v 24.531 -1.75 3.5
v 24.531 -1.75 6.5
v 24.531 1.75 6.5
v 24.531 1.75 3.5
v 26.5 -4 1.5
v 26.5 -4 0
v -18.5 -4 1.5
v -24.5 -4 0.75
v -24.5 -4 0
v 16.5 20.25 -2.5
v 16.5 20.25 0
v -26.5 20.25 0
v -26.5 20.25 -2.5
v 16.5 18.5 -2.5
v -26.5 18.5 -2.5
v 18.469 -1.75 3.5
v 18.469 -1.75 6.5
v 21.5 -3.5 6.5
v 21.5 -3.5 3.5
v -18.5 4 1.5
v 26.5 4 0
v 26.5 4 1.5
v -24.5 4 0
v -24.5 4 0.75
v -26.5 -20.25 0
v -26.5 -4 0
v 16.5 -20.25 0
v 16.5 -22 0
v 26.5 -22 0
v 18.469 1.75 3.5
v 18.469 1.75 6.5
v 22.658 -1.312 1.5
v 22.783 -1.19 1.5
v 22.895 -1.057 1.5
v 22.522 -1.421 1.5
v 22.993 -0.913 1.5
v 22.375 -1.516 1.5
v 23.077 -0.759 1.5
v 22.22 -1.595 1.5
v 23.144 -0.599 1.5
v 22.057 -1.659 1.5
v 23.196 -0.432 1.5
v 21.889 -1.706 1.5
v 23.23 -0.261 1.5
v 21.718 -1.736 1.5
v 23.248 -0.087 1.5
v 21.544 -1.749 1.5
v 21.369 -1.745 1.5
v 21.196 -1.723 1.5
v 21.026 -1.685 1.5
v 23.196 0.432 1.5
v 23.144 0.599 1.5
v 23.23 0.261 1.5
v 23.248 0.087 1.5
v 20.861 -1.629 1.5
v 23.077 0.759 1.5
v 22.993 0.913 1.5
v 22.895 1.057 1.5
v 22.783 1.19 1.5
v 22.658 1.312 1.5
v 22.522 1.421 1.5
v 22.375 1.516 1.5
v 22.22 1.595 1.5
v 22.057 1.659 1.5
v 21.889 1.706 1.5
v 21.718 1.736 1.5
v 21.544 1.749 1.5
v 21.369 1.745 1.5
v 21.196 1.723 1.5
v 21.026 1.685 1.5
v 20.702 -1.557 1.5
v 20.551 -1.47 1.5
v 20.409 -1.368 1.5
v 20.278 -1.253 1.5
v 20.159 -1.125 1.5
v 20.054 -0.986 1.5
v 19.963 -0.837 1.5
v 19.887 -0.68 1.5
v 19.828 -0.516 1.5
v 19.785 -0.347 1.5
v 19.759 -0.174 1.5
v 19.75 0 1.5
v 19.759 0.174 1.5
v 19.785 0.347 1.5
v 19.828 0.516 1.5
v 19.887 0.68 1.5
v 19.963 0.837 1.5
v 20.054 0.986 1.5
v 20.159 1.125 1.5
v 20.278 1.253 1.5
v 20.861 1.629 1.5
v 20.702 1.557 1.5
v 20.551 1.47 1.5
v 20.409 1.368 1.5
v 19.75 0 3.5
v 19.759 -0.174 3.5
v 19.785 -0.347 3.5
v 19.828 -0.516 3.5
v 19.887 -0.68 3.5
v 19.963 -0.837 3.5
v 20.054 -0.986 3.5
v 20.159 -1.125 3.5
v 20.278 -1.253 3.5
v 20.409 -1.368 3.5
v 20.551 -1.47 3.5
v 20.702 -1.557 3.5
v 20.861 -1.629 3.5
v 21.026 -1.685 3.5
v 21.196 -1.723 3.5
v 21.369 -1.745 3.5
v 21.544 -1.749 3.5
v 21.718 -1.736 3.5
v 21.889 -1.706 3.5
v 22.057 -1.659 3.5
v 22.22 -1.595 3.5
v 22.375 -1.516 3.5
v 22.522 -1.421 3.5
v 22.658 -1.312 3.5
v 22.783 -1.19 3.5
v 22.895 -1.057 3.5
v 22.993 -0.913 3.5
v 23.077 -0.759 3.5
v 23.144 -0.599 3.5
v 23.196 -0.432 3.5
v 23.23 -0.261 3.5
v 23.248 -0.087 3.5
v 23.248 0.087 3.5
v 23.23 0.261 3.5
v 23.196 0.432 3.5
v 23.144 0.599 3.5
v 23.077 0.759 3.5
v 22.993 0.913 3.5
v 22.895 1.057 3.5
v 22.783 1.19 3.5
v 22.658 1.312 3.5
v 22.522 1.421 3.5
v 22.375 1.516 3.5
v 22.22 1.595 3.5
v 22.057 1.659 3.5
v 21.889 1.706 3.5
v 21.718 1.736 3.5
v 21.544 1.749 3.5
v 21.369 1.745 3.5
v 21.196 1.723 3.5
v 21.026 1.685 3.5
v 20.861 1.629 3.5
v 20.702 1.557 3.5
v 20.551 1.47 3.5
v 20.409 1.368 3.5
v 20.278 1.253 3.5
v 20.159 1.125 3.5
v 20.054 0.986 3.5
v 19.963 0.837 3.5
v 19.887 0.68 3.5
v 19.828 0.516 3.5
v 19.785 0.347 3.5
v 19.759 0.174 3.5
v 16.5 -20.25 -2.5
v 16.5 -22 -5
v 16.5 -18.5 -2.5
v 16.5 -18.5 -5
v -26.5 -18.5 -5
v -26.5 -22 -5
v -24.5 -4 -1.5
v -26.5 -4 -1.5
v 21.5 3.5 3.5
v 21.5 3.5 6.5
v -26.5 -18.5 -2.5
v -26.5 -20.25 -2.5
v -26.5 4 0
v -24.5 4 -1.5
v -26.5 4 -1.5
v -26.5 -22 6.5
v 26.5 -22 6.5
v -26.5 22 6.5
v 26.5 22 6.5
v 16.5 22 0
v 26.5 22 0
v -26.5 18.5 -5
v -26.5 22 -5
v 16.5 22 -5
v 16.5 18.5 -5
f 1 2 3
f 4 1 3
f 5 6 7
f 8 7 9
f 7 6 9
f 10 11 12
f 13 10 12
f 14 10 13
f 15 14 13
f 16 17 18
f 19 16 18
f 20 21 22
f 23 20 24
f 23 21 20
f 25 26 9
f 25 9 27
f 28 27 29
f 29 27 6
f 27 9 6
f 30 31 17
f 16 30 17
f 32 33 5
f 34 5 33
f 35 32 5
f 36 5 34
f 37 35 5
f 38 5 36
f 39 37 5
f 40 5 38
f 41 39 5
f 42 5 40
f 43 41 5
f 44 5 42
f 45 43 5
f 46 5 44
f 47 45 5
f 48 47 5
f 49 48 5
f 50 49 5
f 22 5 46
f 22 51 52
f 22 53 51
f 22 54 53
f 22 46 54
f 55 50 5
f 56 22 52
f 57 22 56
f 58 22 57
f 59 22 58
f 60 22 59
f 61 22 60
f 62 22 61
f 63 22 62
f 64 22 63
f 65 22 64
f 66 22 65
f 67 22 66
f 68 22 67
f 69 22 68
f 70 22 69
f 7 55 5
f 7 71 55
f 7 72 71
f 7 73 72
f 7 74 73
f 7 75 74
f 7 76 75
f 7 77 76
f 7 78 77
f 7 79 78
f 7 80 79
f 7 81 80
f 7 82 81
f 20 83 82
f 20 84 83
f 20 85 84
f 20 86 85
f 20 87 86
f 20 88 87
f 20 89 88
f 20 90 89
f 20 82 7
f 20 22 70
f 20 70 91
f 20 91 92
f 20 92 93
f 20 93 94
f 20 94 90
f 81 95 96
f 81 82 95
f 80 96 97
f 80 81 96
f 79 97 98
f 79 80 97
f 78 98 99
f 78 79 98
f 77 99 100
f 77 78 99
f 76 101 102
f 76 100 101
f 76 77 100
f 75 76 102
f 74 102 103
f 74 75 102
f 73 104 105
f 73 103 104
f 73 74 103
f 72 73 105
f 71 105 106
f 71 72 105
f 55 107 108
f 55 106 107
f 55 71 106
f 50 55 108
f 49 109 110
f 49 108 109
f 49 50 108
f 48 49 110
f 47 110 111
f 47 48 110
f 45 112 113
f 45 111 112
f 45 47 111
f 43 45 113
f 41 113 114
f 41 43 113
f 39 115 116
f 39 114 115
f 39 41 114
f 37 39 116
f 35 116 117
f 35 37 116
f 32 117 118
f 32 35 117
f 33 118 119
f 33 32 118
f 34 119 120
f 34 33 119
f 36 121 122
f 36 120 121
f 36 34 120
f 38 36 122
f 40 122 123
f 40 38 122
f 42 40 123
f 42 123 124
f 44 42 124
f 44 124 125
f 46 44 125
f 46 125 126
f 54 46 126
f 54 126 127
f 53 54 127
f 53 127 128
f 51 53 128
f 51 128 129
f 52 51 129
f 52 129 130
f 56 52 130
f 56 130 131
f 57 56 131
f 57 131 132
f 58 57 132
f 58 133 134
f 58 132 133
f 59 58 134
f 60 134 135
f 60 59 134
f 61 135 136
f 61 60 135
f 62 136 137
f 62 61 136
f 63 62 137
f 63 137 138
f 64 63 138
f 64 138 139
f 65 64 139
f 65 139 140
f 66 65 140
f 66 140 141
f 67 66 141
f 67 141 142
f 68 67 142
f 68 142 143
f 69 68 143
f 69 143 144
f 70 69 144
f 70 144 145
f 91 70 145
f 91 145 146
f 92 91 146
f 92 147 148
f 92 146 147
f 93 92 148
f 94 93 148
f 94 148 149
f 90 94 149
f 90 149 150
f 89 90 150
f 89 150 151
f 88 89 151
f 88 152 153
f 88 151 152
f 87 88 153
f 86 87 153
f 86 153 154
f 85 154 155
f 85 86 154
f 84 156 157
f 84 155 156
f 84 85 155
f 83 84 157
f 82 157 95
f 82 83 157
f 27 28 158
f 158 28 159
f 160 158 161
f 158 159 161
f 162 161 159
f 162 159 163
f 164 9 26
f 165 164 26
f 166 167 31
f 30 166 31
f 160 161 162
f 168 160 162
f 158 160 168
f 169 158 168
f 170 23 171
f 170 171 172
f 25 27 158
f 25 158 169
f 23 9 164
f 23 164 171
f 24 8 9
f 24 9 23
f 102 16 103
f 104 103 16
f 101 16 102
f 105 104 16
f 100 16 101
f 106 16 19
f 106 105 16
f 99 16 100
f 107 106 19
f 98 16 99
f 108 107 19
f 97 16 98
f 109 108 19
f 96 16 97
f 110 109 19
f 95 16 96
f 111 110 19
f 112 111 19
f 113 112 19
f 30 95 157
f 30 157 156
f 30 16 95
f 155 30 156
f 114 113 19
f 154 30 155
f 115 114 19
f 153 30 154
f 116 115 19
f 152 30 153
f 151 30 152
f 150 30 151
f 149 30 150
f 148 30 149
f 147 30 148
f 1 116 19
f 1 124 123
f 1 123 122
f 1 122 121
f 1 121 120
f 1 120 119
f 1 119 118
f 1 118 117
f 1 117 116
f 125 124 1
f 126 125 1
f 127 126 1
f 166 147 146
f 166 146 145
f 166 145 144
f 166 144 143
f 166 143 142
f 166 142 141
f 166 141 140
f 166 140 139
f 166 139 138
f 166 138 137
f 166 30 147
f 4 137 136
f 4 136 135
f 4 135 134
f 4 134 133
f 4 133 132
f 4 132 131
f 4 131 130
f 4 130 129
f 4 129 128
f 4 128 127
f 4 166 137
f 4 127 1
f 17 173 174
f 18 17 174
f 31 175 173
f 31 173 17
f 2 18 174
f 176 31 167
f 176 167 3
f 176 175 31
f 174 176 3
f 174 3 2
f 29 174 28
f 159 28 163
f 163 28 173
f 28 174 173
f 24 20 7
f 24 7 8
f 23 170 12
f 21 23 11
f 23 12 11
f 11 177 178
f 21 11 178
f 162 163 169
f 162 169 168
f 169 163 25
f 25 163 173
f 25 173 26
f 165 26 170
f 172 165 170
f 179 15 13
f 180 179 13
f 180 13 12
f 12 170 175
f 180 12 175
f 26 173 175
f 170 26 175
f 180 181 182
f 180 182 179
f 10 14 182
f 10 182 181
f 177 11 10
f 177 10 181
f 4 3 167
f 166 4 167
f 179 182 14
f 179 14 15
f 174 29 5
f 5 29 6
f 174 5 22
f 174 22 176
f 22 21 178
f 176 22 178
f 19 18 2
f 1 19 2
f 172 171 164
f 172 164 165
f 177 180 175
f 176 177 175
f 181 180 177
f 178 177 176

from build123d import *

# Parameters (mm, degrees)
CROQUIS1_W              = 53
CROQUIS1_H              = 44
CROQUIS1_R              = 1.75
SALIENTE_EXTRUIR1_DEPTH = 6.5
CROQUIS3_W              = 43
CROQUIS3_H              = 1.75
SALIENTE_EXTRUIR2_DEPTH = 5
CROQUIS4_W              = 43
CROQUIS4_H              = 1.75
SALIENTE_EXTRUIR3_DEPTH = 2.5
CROQUIS5_W              = 53
CROQUIS5_H              = 8
CORTAR_EXTRUIR2_DEPTH   = 1.5
CROQUIS8_W              = 2
CROQUIS8_H              = 8
SALIENTE_EXTRUIR6_DEPTH = 3
SALIENTE_EXTRUIR7_DEPTH = 8
CORTAR_EXTRUIR3_DEPTH   = 3


with BuildPart() as part:
    # Croquis1 → Saliente-Extruir1 (new body)
    with BuildSketch(Plane.XY):
        Rectangle(CROQUIS1_W, CROQUIS1_H)
        with Locations(Location((21.5, 0, 0), (0, 0, 180))):
            Circle(CROQUIS1_R, mode=Mode.SUBTRACT)
    extrude(amount=SALIENTE_EXTRUIR1_DEPTH)

    # Croquis3 → Saliente-Extruir2 (add)
    with BuildSketch(Plane(origin=(0, 0, 0), x_dir=(-1, 0, 0), z_dir=(0, 0, -1))):
        with Locations((5, -21.125)):
            Rectangle(CROQUIS3_W, CROQUIS3_H)
        with Locations((5, 21.125)):
            Rectangle(CROQUIS3_W, CROQUIS3_H)
    extrude(amount=SALIENTE_EXTRUIR2_DEPTH)

    # Croquis4 → Saliente-Extruir3 (add)
    with BuildSketch(Plane(origin=(0, 0, -5), x_dir=(-1, 0, 0), z_dir=(0, 0, -1))):
        with Locations((5, -19.375)):
            Rectangle(CROQUIS4_W, CROQUIS4_H)
        with Locations((5, 19.375)):
            Rectangle(CROQUIS4_W, CROQUIS4_H)
    extrude(amount=-SALIENTE_EXTRUIR3_DEPTH)

    # Croquis5 → Cortar-Extruir2 (cut)
    with BuildSketch(Plane(origin=(0, 0, 0), x_dir=(-1, 0, 0), z_dir=(0, 0, -1))):
        Rectangle(CROQUIS5_W, CROQUIS5_H)
    extrude(amount=-CORTAR_EXTRUIR2_DEPTH, mode=Mode.SUBTRACT)

    # Croquis8 → Saliente-Extruir6 (add)
    with BuildSketch(Plane(origin=(0, 0, 1.5), x_dir=(-1, 0, 0), z_dir=(0, 0, -1))):
        with Locations((25.5, 0)):
            Rectangle(CROQUIS8_W, CROQUIS8_H)
    extrude(amount=SALIENTE_EXTRUIR6_DEPTH)

    # Croquis9 → Saliente-Extruir7 (add)
    with BuildSketch(Plane.XZ.offset(-4)):
        Polygon((-24.5, 1.5), (-18.5, 1.5), (-24.5, 0.75), align=None)
    extrude(amount=SALIENTE_EXTRUIR7_DEPTH)

    # Croquis10 → Cortar-Extruir3 (cut)
    with BuildSketch(Plane.XY.offset(6.5)):
        Polygon((21.5, -3.5), (24.531088913, -1.75), (24.531088913, 1.75), (21.5, 3.5), (18.468911087, 1.75), (18.468911087, -1.75), align=None)
    extrude(amount=-CORTAR_EXTRUIR3_DEPTH, mode=Mode.SUBTRACT)


solid = part.part
